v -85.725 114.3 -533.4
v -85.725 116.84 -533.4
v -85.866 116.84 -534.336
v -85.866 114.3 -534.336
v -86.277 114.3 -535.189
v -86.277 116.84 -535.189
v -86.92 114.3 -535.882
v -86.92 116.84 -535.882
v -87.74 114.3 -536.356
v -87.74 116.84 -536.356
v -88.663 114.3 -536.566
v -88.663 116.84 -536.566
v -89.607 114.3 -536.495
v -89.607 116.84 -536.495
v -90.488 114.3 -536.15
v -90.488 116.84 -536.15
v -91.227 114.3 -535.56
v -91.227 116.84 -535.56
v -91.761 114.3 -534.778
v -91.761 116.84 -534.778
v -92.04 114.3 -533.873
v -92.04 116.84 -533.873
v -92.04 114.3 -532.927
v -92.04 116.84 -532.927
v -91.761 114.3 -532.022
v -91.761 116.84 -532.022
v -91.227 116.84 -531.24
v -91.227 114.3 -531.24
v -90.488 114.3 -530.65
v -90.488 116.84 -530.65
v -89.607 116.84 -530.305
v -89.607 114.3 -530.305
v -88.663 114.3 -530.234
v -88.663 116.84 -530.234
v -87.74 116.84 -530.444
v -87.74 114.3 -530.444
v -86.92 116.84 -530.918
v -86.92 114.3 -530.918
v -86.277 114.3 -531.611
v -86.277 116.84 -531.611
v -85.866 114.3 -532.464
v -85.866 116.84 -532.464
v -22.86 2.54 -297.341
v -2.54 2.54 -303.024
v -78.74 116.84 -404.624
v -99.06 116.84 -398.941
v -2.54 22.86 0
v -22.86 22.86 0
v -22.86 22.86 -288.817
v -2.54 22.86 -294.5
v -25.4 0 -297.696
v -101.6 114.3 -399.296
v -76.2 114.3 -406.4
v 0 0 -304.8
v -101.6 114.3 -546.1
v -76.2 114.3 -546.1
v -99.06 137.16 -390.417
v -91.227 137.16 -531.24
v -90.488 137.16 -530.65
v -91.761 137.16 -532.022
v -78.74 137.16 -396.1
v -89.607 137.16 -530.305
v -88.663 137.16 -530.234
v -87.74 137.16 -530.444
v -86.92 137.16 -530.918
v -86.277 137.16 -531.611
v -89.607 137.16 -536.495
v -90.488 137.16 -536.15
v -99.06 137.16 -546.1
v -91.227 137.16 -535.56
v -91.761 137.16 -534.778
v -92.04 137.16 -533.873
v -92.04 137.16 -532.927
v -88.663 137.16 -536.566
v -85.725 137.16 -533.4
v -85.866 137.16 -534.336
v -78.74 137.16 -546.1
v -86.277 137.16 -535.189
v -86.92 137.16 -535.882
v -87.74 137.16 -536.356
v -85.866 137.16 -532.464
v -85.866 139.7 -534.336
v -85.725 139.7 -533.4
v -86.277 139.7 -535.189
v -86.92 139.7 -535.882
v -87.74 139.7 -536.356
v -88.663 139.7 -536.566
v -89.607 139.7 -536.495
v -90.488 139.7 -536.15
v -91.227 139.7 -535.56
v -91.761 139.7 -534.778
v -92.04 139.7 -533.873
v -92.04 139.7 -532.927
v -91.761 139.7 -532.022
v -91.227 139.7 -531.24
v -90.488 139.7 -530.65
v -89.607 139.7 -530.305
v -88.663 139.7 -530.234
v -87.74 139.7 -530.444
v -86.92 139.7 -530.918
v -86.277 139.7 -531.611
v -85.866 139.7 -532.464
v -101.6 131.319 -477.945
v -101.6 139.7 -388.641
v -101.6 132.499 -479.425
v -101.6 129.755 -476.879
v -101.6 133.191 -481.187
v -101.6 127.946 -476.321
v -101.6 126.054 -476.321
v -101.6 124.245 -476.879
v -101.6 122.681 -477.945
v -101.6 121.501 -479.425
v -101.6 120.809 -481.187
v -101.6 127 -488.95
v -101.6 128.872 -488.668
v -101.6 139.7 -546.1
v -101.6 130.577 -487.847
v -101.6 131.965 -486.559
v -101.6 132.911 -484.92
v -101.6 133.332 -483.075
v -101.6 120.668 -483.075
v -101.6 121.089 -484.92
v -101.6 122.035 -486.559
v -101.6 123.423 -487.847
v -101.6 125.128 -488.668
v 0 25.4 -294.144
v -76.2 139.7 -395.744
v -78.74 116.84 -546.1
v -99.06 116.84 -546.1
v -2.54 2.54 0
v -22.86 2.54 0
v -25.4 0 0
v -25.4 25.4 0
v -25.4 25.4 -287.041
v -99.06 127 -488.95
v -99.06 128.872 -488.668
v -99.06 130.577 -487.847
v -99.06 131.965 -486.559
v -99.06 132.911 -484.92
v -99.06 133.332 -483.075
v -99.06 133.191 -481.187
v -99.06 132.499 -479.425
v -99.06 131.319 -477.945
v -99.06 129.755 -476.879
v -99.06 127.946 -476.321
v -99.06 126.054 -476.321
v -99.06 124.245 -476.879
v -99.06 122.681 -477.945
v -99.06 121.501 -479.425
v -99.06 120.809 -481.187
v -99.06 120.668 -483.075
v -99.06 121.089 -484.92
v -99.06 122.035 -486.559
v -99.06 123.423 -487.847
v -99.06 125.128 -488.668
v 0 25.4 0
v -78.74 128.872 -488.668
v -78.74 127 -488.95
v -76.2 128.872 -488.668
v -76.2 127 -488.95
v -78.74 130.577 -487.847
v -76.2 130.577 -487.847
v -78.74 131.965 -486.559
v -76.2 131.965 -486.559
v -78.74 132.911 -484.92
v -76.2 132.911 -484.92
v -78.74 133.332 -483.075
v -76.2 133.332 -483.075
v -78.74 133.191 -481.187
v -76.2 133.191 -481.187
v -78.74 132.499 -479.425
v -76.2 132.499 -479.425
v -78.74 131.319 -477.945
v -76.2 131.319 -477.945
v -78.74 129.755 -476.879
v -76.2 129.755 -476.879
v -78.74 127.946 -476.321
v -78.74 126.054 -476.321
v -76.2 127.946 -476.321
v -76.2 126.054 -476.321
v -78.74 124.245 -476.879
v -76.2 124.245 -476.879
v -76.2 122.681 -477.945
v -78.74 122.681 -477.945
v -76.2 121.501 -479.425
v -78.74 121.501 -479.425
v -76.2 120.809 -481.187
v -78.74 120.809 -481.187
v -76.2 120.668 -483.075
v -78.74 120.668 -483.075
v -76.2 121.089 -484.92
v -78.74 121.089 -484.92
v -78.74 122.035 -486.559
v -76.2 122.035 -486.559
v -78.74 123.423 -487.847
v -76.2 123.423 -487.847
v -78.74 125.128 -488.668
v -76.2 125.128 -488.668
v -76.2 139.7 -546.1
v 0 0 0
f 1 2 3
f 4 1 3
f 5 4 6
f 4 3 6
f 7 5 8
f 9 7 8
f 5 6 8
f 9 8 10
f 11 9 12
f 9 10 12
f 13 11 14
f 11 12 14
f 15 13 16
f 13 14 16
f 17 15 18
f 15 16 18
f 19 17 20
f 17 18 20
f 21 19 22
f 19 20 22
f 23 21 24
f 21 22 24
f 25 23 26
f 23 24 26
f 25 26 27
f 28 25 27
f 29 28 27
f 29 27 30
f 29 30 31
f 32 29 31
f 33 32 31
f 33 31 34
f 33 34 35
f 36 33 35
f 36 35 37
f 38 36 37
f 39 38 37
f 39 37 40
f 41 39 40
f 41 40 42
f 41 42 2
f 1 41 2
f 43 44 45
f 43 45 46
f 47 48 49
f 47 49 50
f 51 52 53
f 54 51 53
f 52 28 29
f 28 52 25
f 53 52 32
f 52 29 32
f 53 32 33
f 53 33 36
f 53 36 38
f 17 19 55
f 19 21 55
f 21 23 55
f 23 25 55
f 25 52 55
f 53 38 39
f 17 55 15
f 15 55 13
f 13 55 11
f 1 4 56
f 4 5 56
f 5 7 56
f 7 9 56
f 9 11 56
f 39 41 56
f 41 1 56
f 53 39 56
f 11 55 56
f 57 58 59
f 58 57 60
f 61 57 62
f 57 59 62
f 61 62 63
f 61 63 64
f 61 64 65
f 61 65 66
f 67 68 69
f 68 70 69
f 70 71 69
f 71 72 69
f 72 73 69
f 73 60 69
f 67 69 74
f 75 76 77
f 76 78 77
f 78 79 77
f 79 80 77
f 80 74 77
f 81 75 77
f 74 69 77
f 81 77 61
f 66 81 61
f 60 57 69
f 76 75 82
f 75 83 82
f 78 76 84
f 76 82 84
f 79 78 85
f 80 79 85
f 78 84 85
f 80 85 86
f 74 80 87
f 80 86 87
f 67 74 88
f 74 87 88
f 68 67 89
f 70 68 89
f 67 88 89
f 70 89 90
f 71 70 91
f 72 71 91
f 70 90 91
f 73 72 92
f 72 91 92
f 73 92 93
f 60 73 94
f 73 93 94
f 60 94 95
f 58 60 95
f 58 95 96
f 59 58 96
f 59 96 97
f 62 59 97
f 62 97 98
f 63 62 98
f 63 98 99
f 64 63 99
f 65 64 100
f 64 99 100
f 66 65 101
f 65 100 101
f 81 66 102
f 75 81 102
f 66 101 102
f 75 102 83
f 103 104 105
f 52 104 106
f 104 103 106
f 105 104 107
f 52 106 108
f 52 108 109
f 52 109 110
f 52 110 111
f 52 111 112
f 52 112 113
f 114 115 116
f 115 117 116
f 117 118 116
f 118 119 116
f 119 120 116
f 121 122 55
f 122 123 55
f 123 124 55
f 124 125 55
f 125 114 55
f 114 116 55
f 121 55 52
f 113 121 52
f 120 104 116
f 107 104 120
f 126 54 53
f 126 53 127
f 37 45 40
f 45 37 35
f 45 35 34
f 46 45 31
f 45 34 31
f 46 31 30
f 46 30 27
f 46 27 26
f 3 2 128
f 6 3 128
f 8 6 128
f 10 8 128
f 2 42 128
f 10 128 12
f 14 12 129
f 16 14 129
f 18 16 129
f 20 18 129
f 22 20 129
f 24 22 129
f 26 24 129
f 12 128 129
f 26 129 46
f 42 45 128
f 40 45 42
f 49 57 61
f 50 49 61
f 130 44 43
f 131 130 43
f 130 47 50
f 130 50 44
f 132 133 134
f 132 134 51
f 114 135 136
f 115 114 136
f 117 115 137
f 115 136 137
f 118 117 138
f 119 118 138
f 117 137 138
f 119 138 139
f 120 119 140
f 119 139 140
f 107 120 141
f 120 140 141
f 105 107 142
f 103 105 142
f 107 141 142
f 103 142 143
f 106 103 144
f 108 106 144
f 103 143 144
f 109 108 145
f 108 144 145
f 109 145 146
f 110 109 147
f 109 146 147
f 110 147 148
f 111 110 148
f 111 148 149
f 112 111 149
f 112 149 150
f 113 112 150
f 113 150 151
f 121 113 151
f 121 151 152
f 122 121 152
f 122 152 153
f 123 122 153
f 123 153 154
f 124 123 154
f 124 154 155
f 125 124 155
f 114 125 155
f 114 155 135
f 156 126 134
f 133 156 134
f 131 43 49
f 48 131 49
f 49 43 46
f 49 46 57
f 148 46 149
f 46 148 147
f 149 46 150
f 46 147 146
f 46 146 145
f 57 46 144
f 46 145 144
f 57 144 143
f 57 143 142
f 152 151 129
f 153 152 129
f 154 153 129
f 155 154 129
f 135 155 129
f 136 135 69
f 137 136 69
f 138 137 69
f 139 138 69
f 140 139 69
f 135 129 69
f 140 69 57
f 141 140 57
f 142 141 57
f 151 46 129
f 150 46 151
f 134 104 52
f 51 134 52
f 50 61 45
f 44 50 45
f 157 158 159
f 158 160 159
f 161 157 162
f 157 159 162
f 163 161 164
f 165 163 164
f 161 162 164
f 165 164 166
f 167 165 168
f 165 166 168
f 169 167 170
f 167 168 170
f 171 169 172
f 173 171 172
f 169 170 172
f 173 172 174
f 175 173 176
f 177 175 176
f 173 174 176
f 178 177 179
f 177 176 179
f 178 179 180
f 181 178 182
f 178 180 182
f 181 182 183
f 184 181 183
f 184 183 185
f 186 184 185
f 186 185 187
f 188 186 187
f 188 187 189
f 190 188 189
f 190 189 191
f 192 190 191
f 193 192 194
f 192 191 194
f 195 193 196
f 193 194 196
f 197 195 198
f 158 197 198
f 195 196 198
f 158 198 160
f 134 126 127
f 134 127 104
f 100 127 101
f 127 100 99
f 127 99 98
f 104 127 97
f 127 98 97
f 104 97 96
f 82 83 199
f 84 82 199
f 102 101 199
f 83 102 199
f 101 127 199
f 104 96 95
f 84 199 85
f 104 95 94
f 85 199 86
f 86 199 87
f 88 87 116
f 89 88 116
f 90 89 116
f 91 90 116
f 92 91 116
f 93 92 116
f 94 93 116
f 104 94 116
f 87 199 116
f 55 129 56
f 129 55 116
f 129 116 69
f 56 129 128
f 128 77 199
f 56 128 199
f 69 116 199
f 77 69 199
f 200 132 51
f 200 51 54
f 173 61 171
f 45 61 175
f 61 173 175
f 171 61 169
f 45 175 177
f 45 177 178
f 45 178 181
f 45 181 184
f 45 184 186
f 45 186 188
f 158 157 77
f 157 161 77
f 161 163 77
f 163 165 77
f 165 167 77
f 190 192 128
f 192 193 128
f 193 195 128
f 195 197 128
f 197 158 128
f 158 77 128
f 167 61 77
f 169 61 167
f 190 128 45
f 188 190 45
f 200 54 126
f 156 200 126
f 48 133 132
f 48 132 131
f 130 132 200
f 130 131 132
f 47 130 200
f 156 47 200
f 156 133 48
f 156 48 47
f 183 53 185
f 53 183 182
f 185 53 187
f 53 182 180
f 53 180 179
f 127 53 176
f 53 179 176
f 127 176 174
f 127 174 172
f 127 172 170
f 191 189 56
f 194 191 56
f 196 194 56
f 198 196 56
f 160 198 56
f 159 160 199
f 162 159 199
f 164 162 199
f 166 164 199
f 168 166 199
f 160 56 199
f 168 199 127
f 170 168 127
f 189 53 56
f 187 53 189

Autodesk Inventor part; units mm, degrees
ref_plane "YZ Plane" through (0, 0, 0) normal (1, 0, 0) x (0, 1, 0)
ref_plane "XZ Plane" through (0, 0, 0) normal (0, 1, 0) x (-1, 0, 0)
ref_plane "XY Plane" through (0, 0, 0) normal (0, 0, 1) x (1, 0, 0)
sketch "Sketch1" plane through (0, 0, 0) normal (0, 0, 1) x (1, 0, 0)
  line L0 (0, 0) -> (-25.4, 0)
  line L1 (-25.4, 0) -> (-25.4, 25.4)
  line L2 (-25.4, 25.4) -> (0, 25.4)
  line L3 (0, 25.4) -> (0, 0)
  line L4 (-2.54, 22.86) -> (-22.86, 22.86)
  line L5 (-22.86, 22.86) -> (-22.86, 2.54)
  line L6 (-22.86, 2.54) -> (-2.54, 2.54)
  line L7 (-2.54, 2.54) -> (-2.54, 22.86)
  dimension "d0" = 25.4
  dimension "d1" = 25.4
  dimension "d2" = 2.54
sketch "Sketch2" plane through (0, 0, 0) normal (1, 0, 0) x (0, 1, 0)
  line L0 (0, 0) -> (0, -304.8)
  line L1 (0, -304.8) -> (114.3, -406.4)
  line L2 (0, -304.8) -> (152.9283, -304.8) construction
  line L3 (114.3, -406.4) -> (114.3, -546.1)
  dimension "d3" = 304.8
  dimension "d5" = 139.7
  dimension "d6" = 114.3
  dimension "d7" = 101.6
sketch "Sketch3" plane through (0, 0, 0) normal (0, 1, 0) x (-1, 0, 0)
  line L0 (0, -406.4) -> (0, -546.1) projected
  line L1 (0, 0) -> (0, -304.8) projected
  line L2 (0, -304.8) -> (76.2, -406.4)
  line L3 (76.2, -406.4) -> (76.2, -546.1)
  dimension "d8" = 76.2
sketch3d "3D Sketch3"
  line L0 (0, 0, 0) -> (0, 0, -304.8)
  line L1 (0, 0, -304.8) -> (-76.2, 114.3, -406.4)
  line L2 (-76.2, 114.3, -406.4) -> (-76.2, 114.3, -546.1)
sweep "Sweep1" add profiles "Sketch1" path "3D Sketch3"
sketch "Sketch6" plane through (-76.2, 114.3, -546.1) normal (1, 0, 0) x (0, 0, -1)
  circle A0 centre (-63.5, 12.7) radius 6.35
  line L0 (0, 25.4) -> (0, 0) projected
  point P0 (-546.1, -114.3)
  dimension "d19" = 12.7
  dimension "d20" = 63.5
extrude "Extrusion3" cut sketch "Sketch6" against normal through all
sketch "Sketch7" plane through (-101.6, 139.7, -546.1) normal (0, 1, 0) x (1, 0, 0)
  circle A0 centre (12.7, -12.7) radius 3.175
  line L0 (0, -157.4592) -> (0, 0) projected
  line L1 (0, 0) -> (25.4, 0) projected
  point P0 (101.6, -546.1)
  dimension "d23" = 6.35
  dimension "d24" = 12.7
  dimension "d25" = 12.7
extrude "Extrusion4" cut sketch "Sketch7" against normal through all
properties part number "Arm 2"
